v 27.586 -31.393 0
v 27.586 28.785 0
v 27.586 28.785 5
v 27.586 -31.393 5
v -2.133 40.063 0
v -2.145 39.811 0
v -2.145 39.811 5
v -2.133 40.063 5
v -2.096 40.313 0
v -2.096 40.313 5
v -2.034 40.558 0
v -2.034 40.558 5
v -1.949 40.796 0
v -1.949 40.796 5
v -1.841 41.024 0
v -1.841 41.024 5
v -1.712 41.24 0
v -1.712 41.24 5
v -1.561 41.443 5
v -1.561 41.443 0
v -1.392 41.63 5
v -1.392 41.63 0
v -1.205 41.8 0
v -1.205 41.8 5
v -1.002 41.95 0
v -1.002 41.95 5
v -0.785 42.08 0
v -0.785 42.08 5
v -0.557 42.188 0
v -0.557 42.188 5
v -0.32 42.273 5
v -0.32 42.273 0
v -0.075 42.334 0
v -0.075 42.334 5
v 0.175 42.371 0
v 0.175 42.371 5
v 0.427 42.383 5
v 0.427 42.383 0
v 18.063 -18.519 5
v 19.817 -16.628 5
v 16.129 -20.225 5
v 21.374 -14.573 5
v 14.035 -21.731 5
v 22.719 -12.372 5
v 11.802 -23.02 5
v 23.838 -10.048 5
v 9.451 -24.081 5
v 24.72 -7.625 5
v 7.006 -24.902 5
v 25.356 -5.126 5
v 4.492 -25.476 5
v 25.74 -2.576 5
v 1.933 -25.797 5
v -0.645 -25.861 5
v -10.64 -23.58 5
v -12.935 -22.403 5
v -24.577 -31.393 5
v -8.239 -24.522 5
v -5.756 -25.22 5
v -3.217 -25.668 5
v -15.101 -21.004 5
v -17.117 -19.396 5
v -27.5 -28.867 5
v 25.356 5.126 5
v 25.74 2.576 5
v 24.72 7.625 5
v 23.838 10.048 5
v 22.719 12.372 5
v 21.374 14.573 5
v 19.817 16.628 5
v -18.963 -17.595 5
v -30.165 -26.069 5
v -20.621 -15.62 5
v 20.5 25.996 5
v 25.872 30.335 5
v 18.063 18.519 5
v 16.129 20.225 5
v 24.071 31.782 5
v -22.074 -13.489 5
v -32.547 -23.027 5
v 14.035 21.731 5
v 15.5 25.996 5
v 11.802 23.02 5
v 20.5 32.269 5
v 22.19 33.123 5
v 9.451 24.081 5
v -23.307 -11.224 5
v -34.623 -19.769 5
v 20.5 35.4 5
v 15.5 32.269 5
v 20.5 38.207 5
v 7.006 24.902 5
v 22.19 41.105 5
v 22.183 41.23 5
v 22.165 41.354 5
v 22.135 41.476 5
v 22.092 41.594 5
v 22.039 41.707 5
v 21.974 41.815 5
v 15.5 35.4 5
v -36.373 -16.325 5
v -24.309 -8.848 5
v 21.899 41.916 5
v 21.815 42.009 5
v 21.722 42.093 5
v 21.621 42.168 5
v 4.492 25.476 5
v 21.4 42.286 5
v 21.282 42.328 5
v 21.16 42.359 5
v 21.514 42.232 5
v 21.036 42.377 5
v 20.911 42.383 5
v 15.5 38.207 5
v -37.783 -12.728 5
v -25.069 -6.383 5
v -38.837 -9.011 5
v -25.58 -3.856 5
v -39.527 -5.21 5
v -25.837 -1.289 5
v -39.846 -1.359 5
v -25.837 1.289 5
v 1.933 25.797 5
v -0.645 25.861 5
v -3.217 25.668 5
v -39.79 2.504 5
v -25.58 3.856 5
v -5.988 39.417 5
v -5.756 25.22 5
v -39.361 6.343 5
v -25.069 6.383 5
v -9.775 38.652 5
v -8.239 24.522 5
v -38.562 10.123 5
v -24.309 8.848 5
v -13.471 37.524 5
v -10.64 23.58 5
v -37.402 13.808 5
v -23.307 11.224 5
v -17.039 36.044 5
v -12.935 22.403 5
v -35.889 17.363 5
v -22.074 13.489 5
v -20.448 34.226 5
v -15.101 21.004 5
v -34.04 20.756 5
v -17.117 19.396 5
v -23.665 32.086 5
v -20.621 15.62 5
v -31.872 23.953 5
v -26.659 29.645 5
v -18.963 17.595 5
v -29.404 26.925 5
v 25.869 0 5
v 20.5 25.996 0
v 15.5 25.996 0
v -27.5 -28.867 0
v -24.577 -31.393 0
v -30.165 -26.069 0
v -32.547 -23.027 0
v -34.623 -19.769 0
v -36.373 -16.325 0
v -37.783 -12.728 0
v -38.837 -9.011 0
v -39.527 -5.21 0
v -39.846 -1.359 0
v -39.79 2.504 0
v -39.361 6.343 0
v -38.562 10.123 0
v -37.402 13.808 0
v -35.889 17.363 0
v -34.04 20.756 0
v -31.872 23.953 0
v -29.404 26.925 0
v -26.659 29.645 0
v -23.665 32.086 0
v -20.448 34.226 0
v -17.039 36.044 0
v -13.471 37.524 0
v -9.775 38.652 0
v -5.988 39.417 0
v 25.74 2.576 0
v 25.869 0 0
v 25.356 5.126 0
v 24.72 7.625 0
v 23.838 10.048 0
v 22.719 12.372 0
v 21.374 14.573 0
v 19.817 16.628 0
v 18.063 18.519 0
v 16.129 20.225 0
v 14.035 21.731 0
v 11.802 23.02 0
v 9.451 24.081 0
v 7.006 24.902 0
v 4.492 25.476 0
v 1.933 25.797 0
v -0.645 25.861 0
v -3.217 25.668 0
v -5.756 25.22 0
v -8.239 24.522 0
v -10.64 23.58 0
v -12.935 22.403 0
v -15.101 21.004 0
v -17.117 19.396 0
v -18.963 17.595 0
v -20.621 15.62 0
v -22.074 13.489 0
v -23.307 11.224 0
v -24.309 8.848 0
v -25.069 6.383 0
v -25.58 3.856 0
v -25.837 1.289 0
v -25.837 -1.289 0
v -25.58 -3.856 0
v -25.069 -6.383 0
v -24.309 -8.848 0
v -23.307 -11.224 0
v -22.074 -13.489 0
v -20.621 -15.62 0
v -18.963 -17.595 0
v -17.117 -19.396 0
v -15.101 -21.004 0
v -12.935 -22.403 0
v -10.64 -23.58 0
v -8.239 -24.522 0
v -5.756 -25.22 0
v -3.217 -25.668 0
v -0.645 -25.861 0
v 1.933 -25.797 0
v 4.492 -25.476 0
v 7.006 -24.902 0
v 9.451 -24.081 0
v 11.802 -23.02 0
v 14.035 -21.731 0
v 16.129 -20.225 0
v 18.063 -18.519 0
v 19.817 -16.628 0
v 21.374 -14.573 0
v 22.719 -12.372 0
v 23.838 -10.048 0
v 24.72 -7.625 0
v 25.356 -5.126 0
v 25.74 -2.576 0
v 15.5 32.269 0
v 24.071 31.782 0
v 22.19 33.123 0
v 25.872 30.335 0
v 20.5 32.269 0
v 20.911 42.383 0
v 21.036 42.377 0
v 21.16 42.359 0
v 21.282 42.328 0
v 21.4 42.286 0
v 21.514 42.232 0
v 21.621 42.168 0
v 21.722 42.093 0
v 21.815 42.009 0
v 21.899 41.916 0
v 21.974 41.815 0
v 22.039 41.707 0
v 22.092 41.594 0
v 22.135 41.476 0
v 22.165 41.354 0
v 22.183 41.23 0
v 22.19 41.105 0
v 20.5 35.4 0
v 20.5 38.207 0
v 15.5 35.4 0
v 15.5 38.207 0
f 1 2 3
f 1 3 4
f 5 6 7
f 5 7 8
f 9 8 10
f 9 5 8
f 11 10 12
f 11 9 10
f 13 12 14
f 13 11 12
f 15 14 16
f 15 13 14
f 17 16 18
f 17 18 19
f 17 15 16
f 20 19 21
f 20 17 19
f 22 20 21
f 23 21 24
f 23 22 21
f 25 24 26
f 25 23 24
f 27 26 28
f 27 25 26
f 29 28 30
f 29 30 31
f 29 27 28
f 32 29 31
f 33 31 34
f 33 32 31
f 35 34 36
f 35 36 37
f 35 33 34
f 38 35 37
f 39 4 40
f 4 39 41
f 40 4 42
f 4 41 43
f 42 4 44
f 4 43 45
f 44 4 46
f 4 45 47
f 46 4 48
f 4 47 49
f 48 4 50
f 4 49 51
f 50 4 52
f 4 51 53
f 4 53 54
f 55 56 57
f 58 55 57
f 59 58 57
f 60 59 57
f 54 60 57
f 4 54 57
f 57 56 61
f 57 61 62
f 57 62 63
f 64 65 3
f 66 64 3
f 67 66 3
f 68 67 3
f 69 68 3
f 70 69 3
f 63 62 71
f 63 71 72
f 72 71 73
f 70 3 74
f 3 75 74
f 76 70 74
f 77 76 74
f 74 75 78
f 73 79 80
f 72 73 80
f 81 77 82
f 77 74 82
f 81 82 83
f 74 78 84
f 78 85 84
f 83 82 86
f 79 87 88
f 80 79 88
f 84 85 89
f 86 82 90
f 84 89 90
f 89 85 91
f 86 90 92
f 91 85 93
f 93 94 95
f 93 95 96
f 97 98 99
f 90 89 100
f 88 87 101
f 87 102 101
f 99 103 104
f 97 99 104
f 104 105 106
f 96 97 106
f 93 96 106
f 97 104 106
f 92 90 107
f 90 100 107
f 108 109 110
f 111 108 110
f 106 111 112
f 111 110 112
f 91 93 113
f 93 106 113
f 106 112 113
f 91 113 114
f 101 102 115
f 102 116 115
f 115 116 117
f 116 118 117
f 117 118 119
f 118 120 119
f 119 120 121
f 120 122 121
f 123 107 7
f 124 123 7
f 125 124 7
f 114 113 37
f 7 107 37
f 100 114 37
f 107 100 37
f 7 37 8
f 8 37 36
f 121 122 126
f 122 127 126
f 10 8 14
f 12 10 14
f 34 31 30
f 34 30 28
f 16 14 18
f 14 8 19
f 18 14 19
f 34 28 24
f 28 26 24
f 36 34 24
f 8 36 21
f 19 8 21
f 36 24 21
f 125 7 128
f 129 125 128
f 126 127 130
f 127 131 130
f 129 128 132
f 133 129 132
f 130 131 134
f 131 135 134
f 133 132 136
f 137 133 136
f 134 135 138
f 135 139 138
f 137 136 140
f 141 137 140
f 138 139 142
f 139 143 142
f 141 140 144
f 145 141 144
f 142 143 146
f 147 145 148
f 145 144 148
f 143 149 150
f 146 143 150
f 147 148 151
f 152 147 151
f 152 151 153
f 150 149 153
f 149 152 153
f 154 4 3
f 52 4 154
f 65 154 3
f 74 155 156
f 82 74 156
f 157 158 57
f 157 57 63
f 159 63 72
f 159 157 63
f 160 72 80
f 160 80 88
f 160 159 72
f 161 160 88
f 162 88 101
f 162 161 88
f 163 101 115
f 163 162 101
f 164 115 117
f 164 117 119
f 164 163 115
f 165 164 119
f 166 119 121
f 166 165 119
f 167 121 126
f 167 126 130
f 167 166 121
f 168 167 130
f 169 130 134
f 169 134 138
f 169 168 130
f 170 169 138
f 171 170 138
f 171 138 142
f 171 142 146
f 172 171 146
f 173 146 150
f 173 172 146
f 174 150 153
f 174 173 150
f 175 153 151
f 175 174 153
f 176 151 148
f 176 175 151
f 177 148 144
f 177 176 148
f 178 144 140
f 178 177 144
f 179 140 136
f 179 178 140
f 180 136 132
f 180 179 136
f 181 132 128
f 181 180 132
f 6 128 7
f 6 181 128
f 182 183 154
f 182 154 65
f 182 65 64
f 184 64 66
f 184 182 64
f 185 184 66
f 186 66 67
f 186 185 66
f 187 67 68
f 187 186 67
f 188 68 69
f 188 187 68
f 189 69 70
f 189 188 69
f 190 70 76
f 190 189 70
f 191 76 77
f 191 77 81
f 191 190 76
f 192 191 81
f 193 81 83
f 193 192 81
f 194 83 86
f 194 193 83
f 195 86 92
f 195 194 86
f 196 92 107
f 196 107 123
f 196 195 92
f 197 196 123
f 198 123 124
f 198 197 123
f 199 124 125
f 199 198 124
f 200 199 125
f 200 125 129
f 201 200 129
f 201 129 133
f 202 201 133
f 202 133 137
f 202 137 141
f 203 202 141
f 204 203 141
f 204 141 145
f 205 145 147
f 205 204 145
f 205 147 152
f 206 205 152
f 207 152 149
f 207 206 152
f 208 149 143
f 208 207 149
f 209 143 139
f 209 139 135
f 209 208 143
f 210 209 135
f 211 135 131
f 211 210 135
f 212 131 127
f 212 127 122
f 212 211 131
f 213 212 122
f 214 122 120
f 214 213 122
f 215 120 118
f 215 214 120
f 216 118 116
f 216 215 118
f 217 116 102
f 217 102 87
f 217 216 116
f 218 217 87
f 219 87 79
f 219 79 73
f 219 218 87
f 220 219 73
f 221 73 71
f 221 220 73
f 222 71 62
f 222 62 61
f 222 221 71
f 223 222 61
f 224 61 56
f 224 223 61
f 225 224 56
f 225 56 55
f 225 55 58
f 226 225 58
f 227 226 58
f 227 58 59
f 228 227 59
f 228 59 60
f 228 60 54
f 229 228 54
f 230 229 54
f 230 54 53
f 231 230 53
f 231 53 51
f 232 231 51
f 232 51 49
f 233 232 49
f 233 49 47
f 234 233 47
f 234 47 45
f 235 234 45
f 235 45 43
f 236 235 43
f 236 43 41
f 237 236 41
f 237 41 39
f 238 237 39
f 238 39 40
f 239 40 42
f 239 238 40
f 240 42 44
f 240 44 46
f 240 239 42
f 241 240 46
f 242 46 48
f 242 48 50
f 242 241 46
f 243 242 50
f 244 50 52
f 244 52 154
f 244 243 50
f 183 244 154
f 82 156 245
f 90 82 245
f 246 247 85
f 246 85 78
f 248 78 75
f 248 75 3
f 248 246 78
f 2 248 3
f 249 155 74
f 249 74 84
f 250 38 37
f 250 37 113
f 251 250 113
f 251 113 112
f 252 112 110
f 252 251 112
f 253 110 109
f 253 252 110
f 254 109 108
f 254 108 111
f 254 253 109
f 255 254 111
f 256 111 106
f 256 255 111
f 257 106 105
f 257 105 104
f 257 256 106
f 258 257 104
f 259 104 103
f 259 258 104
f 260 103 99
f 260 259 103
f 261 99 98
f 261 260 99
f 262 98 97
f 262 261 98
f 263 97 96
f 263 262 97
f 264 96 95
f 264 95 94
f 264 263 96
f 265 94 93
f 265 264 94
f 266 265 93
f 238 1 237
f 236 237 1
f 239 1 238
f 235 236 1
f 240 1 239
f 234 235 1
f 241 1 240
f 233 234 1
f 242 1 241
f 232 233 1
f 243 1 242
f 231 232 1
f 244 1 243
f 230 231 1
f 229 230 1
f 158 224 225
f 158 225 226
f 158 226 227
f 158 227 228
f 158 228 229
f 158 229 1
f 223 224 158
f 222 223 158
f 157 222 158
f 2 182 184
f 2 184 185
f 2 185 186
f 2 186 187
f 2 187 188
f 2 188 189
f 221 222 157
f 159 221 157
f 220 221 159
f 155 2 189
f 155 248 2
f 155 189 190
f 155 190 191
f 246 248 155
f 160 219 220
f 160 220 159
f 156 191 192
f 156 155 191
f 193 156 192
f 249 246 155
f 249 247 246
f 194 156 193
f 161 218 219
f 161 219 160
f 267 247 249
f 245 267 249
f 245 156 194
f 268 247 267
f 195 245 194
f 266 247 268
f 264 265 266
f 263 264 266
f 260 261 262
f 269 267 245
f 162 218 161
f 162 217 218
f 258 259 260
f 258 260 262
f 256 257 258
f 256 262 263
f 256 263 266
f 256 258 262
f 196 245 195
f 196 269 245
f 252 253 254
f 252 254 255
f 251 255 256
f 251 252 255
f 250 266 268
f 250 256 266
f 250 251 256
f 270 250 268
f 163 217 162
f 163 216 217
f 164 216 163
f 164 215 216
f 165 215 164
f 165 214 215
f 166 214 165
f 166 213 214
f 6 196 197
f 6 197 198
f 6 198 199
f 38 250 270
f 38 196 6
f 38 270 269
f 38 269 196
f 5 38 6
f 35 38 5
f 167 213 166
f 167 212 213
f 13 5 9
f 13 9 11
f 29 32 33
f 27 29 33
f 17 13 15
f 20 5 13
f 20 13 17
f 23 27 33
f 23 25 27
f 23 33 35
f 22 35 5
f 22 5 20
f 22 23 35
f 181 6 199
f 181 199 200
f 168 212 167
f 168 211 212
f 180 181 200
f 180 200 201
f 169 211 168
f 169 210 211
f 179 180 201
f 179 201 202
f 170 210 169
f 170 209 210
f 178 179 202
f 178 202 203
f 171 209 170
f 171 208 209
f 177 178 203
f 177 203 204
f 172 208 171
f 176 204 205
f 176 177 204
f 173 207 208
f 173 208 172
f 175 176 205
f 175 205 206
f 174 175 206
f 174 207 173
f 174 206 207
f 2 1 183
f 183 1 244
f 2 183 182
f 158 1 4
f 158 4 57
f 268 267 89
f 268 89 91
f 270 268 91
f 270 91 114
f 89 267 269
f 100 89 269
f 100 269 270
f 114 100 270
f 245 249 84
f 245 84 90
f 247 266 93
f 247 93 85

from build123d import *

# Parameters (mm, degrees)
SKETCH1_R           = 25.869040911
BOSS_EXTRUDE1_DEPTH = 5
CUT_EXTRUDE1_REACH  = 7
SKETCH2_W           = 5
SKETCH2_H           = 2.807032228
SKETCH2_H_2         = 6.272905991


with BuildPart() as part:
    # Sketch1 → Boss-Extrude1 (new body)
    with BuildSketch(Plane.XY):
        with BuildLine():
            Line((27.585503877, -31.392941885), (-24.576892053, -31.392941885))
            ThreePointArc((-24.576892053, -31.392941885), (-38.026656197, 11.979726275), (-2.145068244, 39.811293691))
            ThreePointArc((-2.145068244, 39.811293691), (-1.391692185, 41.630104391), (0.427118514, 42.38348045))
            Line((0.427118514, 42.38348045), (20.910674351, 42.38348045))
            ThreePointArc((20.910674351, 42.38348045), (21.815017729, 42.008889157), (22.189609022, 41.104545778))
            Line((22.189609022, 41.104545778), (22.189609022, 33.1234309))
            ThreePointArc((22.189609022, 33.1234309), (24.981909543, 31.071604702), (27.585503877, 28.785072503))
            Line((27.585503877, 28.785072503), (27.585503877, -31.392941885))
        make_face()
        Circle(SKETCH1_R, mode=Mode.SUBTRACT)
    extrude(amount=BOSS_EXTRUDE1_DEPTH)

    # Sketch2 → Cut-Extrude1 (cut, up to next)
    with BuildSketch(Plane(origin=(0, 0, 0), x_dir=(-1, 0, 0), z_dir=(0, 0, -1)), mode=Mode.PRIVATE) as cut_extrude1_sk1:
        with Locations((-18, 36.803720292)):
            Rectangle(SKETCH2_W, SKETCH2_H)
    cut_extrude1_tool1 = extrude(cut_extrude1_sk1.sketch, amount=-CUT_EXTRUDE1_REACH, mode=Mode.PRIVATE) & part.part
    add(cut_extrude1_tool1.solids().sort_by_distance((18, 36.80372, 0))[0], mode=Mode.SUBTRACT)
    # Sketch2 → Cut-Extrude1 (cut, up to next)
    with BuildSketch(Plane(origin=(0, 0, 0), x_dir=(-1, 0, 0), z_dir=(0, 0, -1)), mode=Mode.PRIVATE) as cut_extrude1_sk2:
        with Locations((-18, 29.132248973)):
            Rectangle(SKETCH2_W, SKETCH2_H_2)
    cut_extrude1_tool2 = extrude(cut_extrude1_sk2.sketch, amount=-CUT_EXTRUDE1_REACH, mode=Mode.PRIVATE) & part.part
    add(cut_extrude1_tool2.solids().sort_by_distance((18, 29.132249, 0))[0], mode=Mode.SUBTRACT)


solid = part.part
